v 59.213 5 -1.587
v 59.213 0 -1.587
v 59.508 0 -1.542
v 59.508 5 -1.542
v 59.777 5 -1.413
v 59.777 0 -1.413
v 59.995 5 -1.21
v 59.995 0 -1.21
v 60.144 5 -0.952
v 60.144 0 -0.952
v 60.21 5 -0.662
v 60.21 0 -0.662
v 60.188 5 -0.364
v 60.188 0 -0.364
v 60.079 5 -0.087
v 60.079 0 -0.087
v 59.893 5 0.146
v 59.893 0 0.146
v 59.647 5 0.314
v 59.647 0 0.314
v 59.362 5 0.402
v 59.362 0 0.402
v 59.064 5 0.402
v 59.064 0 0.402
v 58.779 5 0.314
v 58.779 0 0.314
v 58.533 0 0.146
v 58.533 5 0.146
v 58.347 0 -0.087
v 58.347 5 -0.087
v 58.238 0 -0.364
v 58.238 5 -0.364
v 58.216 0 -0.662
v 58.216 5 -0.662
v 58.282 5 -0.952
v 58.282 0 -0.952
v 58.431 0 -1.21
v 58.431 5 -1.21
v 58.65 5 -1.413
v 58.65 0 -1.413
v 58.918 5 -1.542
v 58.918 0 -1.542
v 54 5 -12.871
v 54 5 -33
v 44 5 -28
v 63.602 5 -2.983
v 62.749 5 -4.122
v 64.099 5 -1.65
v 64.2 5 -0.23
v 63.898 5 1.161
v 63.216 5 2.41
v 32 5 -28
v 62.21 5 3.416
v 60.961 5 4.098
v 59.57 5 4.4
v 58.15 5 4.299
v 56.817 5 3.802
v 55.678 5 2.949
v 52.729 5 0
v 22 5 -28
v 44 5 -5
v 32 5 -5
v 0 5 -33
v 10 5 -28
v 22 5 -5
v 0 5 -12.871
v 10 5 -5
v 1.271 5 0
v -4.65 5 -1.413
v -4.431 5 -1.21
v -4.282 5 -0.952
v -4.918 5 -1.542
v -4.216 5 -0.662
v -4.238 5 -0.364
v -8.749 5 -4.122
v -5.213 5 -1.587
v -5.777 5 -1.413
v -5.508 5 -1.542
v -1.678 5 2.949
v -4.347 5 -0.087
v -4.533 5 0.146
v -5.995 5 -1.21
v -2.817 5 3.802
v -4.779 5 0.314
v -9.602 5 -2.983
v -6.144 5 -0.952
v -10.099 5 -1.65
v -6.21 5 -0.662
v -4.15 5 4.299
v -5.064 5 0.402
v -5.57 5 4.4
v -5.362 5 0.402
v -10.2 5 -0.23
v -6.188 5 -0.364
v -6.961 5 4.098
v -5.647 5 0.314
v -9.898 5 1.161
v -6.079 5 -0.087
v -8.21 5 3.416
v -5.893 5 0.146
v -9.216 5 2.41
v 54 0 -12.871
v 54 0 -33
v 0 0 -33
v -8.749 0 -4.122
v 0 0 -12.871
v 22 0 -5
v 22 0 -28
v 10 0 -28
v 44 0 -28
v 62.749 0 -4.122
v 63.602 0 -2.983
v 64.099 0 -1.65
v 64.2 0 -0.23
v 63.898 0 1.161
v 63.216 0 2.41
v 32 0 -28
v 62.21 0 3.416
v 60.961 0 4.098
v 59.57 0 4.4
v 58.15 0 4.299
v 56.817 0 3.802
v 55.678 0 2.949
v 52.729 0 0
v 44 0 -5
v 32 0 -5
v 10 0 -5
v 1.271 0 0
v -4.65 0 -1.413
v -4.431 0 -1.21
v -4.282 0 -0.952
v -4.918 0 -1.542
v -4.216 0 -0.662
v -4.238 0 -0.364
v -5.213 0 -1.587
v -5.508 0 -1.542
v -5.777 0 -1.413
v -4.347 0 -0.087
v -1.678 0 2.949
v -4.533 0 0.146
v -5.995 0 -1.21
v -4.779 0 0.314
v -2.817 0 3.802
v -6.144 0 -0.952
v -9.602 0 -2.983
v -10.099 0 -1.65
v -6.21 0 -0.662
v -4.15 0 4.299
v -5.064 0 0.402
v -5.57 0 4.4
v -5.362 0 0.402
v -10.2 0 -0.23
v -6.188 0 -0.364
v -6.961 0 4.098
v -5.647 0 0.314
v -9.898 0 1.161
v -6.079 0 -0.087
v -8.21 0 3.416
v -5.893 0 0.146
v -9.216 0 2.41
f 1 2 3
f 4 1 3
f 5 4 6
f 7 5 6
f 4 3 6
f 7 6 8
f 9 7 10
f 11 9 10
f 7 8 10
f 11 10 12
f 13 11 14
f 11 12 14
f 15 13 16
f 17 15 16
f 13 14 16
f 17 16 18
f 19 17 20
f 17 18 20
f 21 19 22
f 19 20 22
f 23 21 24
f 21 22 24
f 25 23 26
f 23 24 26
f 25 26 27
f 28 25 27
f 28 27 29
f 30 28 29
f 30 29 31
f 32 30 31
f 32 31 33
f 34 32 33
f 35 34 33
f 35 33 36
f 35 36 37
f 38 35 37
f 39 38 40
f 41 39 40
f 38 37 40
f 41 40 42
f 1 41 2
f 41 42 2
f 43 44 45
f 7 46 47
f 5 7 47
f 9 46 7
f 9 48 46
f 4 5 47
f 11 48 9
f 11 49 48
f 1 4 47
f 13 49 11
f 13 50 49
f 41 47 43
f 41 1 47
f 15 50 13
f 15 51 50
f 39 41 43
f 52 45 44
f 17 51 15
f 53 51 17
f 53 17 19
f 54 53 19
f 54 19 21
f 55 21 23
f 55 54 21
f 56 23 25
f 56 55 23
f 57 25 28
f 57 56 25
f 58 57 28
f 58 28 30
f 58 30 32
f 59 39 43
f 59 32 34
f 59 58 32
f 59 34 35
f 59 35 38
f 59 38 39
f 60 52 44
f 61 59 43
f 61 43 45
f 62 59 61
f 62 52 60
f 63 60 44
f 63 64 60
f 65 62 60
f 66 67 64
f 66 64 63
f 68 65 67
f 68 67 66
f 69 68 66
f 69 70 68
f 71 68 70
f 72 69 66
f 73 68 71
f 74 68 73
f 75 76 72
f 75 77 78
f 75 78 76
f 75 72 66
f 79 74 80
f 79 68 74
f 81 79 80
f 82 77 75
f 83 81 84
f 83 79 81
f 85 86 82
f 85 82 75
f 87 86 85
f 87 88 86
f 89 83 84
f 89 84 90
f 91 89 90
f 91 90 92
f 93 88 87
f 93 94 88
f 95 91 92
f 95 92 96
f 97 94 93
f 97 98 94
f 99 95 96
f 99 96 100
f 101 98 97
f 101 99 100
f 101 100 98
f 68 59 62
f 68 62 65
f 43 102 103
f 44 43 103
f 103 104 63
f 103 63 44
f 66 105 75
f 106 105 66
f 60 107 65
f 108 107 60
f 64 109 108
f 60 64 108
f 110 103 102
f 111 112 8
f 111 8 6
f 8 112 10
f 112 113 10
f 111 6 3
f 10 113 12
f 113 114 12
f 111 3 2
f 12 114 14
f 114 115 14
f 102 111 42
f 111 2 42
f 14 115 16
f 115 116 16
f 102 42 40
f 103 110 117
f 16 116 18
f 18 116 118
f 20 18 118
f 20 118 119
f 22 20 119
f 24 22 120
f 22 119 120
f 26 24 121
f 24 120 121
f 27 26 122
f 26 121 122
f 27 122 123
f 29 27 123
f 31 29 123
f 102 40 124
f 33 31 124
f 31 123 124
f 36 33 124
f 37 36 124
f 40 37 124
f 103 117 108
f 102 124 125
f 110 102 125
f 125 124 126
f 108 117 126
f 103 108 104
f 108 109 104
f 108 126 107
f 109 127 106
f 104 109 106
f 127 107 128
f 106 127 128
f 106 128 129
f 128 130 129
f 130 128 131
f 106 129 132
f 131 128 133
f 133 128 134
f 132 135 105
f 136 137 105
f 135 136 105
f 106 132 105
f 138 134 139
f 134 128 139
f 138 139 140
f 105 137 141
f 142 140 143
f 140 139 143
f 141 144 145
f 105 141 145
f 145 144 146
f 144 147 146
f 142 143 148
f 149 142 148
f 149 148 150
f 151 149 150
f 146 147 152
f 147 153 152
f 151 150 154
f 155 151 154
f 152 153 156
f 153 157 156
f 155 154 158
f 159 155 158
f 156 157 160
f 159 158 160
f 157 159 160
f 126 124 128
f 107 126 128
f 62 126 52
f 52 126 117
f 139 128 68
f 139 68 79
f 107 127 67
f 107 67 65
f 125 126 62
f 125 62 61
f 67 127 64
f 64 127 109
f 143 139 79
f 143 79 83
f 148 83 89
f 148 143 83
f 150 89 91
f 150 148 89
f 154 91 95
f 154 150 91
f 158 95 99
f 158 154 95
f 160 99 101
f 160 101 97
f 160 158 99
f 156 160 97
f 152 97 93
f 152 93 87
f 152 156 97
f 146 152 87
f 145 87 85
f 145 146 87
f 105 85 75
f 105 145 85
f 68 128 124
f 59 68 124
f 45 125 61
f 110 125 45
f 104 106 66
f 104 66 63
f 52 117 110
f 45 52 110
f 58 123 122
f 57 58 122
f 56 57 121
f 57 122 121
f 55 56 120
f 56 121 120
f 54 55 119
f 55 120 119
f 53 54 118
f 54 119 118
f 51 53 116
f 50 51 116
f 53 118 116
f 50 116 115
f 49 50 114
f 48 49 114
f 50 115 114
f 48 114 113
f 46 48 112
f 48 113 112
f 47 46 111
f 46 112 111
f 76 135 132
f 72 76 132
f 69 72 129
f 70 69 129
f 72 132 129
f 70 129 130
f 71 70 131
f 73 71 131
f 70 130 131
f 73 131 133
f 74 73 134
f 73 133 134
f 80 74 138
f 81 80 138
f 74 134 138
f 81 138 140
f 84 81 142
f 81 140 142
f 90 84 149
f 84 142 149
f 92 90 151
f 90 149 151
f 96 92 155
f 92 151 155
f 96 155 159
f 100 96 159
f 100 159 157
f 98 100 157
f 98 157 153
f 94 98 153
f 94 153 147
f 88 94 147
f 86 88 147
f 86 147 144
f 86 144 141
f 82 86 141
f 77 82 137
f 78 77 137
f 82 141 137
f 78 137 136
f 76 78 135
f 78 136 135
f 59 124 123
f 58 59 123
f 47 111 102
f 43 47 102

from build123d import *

# Parameters (mm, degrees)
SKETCH1_W           = 54
SKETCH1_H           = 33
SKETCH1_W_2         = 12
SKETCH1_H_2         = 23
BOSS_EXTRUDE1_DEPTH = 5
SKETCH4_R           = 1
BOSS_EXTRUDE2_DEPTH = 5


with BuildPart() as part:
    # Sketch1 → Boss-Extrude1 (new body)
    with BuildSketch(Plane(origin=(0, 0, 0), x_dir=(1, 0, 0), z_dir=(0, 1, 0))):
        with Locations((27, 16.5)):
            Rectangle(SKETCH1_W, SKETCH1_H)
        with Locations((16, 16.5)):
            Rectangle(SKETCH1_W_2, SKETCH1_H_2, mode=Mode.SUBTRACT)
        with Locations((38, 16.5)):
            Rectangle(SKETCH1_W_2, SKETCH1_H_2, mode=Mode.SUBTRACT)
    extrude(amount=BOSS_EXTRUDE1_DEPTH)

    # Sketch4 → Boss-Extrude2 (add)
    # profile 1 of 2: a face of its own
    with BuildSketch(Plane.XZ):
        with BuildLine():
            Line((62.748737342, -4.12233047), (54, -12.871067812))
            Line((54, -12.871067812), (54, 0))
            Line((54, 0), (52.728932188, 0))
            Line((52.728932188, 0), (55.67766953, 2.948737342))
            ThreePointArc((55.67766953, 2.948737342), (62.748737342, 2.948737342), (62.748737342, -4.12233047))
        make_face()
        with Locations(Location((59.213203436, -0.586796564, 0), (0, 0, 270))):
            Circle(SKETCH4_R, mode=Mode.SUBTRACT)
    # profile 2 of 2: a face of its own
    with BuildSketch(Plane.XZ):
        with BuildLine():
            Line((-8.748737342, -4.12233047), (0, -12.871067812))
            Line((0, -12.871067812), (0, 0))
            Line((0, 0), (1.271067812, 0))
            Line((1.271067812, 0), (-1.67766953, 2.948737342))
            ThreePointArc((-1.67766953, 2.948737342), (-8.748737342, 2.948737342), (-8.748737342, -4.12233047))
        make_face()
        with Locations(Location((-5.213203436, -0.586796564, 0), (0, 0, 270))):
            Circle(SKETCH4_R, mode=Mode.SUBTRACT)
    extrude(amount=-BOSS_EXTRUDE2_DEPTH)


solid = part.part
